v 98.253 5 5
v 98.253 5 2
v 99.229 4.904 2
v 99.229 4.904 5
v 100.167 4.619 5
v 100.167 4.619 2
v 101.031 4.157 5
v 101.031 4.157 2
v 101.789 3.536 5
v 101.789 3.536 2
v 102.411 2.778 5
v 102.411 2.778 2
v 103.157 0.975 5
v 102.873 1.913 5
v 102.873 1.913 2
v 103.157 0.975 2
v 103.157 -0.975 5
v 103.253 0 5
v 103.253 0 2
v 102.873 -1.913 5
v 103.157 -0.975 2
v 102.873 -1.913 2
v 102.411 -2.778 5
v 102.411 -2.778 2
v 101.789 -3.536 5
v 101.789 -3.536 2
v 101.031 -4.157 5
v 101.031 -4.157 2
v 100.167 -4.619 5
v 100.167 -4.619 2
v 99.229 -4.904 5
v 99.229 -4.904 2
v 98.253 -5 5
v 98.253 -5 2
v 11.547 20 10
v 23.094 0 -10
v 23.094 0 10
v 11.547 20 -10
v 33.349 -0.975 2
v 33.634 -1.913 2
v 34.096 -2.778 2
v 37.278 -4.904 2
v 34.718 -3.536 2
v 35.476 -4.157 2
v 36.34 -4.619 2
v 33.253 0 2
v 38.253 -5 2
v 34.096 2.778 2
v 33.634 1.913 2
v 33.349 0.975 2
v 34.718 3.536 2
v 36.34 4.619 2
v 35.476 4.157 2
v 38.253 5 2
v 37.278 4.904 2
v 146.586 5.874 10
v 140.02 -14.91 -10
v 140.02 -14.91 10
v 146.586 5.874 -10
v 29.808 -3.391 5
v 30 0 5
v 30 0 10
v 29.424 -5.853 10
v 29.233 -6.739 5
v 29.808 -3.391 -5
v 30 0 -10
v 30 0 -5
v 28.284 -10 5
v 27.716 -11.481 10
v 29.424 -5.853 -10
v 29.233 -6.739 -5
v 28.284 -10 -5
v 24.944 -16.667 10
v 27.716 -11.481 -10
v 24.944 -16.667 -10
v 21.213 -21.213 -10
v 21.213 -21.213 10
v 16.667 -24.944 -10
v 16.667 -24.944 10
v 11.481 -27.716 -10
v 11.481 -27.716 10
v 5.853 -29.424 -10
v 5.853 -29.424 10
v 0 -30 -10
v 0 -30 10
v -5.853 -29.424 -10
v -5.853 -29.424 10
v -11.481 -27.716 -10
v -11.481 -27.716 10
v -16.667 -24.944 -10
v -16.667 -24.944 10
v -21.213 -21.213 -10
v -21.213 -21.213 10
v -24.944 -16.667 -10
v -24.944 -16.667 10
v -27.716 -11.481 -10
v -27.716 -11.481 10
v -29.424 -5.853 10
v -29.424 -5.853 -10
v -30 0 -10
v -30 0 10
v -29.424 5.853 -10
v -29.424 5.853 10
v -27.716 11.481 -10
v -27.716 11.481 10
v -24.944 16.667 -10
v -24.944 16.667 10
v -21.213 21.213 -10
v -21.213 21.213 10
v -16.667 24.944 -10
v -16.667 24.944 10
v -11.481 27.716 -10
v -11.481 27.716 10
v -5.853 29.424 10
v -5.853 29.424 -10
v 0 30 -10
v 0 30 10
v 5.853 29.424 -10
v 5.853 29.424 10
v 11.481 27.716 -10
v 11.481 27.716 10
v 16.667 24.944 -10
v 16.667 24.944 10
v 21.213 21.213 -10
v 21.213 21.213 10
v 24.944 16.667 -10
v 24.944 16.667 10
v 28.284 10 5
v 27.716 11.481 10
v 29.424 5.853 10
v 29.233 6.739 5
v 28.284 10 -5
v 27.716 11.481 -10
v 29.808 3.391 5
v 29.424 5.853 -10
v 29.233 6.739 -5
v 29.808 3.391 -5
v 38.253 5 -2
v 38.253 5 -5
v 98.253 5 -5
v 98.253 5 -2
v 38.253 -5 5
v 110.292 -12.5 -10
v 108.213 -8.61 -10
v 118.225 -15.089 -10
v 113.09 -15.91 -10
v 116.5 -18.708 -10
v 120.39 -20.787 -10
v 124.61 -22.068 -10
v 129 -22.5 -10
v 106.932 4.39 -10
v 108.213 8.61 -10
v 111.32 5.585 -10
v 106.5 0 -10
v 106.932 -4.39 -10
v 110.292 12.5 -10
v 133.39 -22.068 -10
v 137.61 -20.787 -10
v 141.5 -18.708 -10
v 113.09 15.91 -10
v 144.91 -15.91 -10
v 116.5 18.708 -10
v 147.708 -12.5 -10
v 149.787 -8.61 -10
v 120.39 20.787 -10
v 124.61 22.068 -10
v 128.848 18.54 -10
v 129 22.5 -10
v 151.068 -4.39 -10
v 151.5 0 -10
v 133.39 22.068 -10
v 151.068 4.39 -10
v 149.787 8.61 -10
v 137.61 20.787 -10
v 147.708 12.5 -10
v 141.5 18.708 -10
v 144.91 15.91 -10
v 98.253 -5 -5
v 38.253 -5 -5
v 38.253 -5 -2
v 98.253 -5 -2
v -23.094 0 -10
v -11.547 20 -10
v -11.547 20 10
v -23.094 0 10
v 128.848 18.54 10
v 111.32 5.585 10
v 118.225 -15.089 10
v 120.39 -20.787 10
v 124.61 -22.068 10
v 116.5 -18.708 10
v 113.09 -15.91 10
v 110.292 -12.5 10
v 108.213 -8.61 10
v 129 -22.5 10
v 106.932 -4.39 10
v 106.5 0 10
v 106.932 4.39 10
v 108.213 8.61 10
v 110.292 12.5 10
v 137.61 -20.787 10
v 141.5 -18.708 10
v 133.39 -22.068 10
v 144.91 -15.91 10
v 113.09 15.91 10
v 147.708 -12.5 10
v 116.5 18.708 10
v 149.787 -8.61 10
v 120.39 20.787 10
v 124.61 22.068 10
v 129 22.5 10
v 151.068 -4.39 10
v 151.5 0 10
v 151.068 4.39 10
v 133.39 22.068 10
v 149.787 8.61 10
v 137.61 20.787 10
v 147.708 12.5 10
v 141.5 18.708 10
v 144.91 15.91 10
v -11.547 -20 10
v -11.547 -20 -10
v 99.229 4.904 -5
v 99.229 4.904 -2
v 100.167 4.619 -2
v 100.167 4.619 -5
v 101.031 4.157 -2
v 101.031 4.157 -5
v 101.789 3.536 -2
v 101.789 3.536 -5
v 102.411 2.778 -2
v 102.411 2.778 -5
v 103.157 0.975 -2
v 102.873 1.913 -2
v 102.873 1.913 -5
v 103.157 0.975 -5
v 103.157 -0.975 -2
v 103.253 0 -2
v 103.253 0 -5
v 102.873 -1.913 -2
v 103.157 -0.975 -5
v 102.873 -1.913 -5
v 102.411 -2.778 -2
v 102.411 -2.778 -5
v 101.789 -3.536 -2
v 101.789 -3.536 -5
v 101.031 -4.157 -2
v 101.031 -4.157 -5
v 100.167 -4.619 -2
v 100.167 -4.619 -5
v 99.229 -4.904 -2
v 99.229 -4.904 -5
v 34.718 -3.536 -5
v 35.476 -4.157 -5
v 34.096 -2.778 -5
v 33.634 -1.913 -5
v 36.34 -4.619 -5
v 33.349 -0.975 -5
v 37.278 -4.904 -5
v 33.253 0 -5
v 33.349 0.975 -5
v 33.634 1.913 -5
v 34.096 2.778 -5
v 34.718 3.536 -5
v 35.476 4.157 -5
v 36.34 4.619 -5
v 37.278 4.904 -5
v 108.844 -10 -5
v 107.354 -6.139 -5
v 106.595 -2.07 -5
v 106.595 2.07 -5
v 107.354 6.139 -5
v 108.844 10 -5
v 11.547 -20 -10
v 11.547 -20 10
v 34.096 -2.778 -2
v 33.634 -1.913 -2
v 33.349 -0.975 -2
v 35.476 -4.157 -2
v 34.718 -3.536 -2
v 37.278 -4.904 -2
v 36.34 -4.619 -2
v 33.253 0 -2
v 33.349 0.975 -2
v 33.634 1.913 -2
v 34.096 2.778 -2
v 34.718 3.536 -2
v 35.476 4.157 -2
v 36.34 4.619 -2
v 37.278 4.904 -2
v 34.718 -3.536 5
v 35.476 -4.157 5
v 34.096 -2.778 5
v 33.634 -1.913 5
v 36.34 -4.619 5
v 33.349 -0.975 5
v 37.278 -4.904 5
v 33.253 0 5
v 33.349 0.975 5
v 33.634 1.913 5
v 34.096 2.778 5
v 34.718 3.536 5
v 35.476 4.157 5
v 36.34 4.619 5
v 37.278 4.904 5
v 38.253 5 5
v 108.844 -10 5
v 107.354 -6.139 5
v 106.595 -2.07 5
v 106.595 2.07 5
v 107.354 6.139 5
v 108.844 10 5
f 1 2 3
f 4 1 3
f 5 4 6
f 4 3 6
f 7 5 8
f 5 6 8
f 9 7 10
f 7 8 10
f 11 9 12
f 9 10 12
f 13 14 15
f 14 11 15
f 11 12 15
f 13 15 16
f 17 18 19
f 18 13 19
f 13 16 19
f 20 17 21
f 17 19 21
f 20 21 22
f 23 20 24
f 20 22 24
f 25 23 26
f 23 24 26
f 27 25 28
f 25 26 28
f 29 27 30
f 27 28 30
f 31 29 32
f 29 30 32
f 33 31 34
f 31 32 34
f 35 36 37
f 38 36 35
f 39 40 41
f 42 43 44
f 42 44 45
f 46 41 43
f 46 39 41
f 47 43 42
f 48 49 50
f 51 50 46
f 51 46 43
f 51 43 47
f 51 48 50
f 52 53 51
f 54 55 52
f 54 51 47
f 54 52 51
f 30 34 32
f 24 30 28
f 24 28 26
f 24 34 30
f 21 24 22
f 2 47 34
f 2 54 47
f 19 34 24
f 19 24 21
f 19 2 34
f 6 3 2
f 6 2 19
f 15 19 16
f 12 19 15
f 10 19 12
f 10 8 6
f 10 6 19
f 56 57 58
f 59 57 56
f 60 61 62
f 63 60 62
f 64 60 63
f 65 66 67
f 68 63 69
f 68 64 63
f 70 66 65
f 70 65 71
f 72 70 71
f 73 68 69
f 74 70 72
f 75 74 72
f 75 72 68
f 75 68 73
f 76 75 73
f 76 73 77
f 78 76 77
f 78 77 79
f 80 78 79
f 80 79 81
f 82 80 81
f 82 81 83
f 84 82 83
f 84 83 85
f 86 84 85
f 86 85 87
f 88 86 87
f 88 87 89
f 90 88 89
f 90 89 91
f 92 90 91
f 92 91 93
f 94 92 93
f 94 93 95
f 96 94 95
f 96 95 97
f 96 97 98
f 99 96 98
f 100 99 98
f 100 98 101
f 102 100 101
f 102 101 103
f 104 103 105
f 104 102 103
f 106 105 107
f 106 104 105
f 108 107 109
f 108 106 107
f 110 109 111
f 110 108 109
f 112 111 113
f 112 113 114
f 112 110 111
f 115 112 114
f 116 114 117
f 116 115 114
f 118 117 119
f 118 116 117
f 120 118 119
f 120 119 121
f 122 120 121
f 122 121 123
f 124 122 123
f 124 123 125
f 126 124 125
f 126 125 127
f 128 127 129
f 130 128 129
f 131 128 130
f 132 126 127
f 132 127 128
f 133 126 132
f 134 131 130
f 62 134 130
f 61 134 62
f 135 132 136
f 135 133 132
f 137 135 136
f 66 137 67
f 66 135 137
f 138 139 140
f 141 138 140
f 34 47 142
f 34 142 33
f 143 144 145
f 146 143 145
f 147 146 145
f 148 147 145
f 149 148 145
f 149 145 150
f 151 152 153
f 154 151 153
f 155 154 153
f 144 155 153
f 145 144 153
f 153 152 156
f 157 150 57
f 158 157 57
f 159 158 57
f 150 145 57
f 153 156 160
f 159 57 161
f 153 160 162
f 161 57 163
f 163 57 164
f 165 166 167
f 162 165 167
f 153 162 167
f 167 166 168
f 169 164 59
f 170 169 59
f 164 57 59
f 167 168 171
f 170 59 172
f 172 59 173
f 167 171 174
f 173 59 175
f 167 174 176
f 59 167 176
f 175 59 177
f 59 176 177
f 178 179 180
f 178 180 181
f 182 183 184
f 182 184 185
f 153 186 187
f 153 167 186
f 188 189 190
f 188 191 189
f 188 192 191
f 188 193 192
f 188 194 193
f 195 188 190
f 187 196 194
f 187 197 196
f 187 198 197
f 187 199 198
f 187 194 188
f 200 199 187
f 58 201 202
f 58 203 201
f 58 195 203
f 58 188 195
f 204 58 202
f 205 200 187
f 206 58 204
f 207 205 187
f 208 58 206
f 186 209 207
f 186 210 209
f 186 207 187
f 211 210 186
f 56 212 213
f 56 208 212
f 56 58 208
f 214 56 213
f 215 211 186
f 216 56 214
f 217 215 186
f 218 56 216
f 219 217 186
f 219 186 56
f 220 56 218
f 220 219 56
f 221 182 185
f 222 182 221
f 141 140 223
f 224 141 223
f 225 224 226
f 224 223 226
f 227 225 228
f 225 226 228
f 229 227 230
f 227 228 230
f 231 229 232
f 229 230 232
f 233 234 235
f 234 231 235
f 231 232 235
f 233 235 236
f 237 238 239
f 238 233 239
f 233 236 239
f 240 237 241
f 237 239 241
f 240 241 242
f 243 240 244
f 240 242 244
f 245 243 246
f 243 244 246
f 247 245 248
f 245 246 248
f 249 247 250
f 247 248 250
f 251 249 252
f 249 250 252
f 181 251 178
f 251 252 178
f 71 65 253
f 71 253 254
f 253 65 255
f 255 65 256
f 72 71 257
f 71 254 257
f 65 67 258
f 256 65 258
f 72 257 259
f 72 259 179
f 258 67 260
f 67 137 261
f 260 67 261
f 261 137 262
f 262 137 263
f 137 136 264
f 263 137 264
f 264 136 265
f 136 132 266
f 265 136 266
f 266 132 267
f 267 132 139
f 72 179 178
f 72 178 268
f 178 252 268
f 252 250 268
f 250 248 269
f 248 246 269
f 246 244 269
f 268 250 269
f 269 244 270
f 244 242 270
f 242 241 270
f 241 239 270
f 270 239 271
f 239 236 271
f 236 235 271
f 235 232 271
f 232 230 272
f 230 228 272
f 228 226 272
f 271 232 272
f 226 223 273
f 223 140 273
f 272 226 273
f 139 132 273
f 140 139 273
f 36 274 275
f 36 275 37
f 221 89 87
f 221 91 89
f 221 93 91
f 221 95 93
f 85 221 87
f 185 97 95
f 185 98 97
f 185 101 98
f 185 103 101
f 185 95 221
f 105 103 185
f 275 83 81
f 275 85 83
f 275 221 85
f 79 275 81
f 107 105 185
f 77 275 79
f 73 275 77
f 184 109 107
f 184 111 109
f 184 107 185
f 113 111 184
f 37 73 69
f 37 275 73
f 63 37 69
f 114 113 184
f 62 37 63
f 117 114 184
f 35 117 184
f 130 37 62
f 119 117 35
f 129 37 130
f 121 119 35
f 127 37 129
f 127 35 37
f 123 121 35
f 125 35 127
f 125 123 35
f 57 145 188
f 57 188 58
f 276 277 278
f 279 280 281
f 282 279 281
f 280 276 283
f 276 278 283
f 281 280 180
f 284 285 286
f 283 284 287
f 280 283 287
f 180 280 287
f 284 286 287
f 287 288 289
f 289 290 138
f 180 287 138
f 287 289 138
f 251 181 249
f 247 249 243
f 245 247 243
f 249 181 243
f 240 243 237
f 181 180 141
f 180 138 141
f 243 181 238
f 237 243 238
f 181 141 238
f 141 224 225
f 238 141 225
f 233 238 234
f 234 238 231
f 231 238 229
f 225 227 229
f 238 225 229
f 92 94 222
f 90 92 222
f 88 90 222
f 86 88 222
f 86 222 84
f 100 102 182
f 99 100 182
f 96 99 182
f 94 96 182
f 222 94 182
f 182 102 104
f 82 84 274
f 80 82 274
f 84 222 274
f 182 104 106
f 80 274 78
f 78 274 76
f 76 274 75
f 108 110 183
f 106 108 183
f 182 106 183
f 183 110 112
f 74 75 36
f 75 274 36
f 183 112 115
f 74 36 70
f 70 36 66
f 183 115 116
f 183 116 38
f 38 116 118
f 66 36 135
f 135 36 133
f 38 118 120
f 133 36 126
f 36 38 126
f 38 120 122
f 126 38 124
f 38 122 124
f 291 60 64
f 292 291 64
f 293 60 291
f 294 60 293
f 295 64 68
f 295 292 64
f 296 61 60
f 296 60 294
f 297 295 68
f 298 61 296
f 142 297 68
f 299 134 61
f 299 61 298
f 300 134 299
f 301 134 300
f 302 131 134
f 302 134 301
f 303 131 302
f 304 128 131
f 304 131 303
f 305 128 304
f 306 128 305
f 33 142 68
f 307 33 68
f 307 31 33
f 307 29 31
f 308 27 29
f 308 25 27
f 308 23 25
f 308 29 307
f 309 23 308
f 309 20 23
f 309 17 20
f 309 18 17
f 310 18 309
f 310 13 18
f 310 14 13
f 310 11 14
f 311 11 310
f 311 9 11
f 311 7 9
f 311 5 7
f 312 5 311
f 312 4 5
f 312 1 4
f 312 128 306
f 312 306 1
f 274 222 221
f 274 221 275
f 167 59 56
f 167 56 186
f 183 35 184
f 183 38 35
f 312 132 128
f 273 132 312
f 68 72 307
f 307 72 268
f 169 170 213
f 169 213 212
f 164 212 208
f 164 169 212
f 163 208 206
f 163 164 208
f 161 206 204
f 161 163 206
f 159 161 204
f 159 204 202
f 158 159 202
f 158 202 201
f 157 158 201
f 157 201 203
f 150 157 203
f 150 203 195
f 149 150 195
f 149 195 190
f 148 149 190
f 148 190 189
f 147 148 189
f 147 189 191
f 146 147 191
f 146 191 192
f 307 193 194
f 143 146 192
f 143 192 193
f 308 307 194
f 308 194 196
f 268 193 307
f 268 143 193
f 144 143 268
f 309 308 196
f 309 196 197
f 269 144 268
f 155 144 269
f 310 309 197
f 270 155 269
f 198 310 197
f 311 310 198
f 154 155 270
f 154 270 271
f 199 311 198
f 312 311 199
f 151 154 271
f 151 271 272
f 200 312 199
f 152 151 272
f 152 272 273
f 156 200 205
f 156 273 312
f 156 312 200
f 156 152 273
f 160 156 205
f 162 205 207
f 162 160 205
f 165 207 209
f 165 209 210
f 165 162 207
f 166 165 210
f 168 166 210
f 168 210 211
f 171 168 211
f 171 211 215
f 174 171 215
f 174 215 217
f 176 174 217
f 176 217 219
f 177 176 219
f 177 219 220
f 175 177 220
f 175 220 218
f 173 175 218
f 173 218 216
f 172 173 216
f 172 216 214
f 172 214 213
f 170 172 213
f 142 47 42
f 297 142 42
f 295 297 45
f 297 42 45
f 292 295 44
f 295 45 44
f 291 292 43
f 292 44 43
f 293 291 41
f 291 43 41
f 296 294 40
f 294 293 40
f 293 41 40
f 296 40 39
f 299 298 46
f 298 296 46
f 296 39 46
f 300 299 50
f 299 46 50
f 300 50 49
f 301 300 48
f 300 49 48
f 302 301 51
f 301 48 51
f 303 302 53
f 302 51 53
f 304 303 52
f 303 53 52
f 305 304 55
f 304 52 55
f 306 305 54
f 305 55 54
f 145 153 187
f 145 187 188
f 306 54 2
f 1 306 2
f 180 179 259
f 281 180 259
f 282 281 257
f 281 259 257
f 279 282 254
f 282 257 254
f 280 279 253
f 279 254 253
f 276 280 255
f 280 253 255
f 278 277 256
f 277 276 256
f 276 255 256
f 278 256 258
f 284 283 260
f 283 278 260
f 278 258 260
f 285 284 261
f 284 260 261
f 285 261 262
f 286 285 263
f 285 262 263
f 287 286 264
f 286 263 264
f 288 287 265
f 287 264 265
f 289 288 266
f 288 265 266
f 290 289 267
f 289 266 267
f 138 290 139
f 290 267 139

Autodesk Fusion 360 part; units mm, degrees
sketch "Sketch1" plane through (0, 0, 0) normal (0, 0, 1) x (1, 0, 0) in component "exercise 2"
  circle A0 centre (0, 0) radius 30
  line L0 (0, 0) -> (129, 0) construction
  circle A1 centre (129, 0) radius 22.5
  line L1 (28.2843, 10) -> (108.8444, 10)
  line L2 (28.2843, -10) -> (108.8444, -10)
  line L3 (-11.547, 20) -> (-23.094, 0)
  line L4 (-23.094, 0) -> (-11.547, -20)
  line L5 (-11.547, -20) -> (11.547, -20)
  line L6 (11.547, -20) -> (23.094, 0)
  line L7 (23.094, 0) -> (11.547, 20)
  line L8 (11.547, 20) -> (-11.547, 20)
  line L9 (140.0205, -14.9103) -> (146.5861, 5.8736)
  line L10 (146.5861, 5.8736) -> (128.8482, 18.5404)
  line L11 (128.8482, 18.5404) -> (111.3201, 5.585)
  line L12 (111.3201, 5.585) -> (118.225, -15.0887)
  line L13 (118.225, -15.0887) -> (140.0205, -14.9103)
  line L14 (64.5, 0) -> (64.5, 50) construction
  line L15 (38.2534, 0) -> (64.5, 0)
  line L16 (43.2534, 0) -> (98.2534, 0) construction
  line L17 (38.2534, 5) -> (98.2534, 5)
  line L18 (38.2534, -5) -> (98.2534, -5)
  arc A2 (38.2534, 5) -> (38.2534, -5) centre (38.2534, 0) ccw
  arc A3 (98.2534, -5) -> (98.2534, 5) centre (98.2534, 0) ccw
  point P0 (129, 0)
  dimension "d1" = 60
  dimension "d2" = 45
  dimension "d3" = 129
  dimension "d6" = 20
  dimension "d7" = 15
  dimension "d8" = 10
  dimension "d9" = 10
  dimension "d10" = 60
extrude "Extrude1" add sketch "Sketch1" along normal mid plane 20 contours A0 | A1 makes body 1 at (27.1662, -12.7278, 3.3333) makes body 2 at (151.3882, -2.2403, -3.3333) in component "exercise 2"
extrude "Extrude2" add sketch "Sketch1" along normal mid plane 10 contours A0 A1 L1 L2 bodies 1 2 in component "exercise 2"
extrude "Extrude3" add sketch "Sketch1" along normal mid plane 4 contours L17 L18 A2 A3 bodies 1 in component "exercise 2"
component "exercise 2" placed x (1, 0, 0) y (0, 1, 0) z (0, 0, 1) at (0, 0, 0)
